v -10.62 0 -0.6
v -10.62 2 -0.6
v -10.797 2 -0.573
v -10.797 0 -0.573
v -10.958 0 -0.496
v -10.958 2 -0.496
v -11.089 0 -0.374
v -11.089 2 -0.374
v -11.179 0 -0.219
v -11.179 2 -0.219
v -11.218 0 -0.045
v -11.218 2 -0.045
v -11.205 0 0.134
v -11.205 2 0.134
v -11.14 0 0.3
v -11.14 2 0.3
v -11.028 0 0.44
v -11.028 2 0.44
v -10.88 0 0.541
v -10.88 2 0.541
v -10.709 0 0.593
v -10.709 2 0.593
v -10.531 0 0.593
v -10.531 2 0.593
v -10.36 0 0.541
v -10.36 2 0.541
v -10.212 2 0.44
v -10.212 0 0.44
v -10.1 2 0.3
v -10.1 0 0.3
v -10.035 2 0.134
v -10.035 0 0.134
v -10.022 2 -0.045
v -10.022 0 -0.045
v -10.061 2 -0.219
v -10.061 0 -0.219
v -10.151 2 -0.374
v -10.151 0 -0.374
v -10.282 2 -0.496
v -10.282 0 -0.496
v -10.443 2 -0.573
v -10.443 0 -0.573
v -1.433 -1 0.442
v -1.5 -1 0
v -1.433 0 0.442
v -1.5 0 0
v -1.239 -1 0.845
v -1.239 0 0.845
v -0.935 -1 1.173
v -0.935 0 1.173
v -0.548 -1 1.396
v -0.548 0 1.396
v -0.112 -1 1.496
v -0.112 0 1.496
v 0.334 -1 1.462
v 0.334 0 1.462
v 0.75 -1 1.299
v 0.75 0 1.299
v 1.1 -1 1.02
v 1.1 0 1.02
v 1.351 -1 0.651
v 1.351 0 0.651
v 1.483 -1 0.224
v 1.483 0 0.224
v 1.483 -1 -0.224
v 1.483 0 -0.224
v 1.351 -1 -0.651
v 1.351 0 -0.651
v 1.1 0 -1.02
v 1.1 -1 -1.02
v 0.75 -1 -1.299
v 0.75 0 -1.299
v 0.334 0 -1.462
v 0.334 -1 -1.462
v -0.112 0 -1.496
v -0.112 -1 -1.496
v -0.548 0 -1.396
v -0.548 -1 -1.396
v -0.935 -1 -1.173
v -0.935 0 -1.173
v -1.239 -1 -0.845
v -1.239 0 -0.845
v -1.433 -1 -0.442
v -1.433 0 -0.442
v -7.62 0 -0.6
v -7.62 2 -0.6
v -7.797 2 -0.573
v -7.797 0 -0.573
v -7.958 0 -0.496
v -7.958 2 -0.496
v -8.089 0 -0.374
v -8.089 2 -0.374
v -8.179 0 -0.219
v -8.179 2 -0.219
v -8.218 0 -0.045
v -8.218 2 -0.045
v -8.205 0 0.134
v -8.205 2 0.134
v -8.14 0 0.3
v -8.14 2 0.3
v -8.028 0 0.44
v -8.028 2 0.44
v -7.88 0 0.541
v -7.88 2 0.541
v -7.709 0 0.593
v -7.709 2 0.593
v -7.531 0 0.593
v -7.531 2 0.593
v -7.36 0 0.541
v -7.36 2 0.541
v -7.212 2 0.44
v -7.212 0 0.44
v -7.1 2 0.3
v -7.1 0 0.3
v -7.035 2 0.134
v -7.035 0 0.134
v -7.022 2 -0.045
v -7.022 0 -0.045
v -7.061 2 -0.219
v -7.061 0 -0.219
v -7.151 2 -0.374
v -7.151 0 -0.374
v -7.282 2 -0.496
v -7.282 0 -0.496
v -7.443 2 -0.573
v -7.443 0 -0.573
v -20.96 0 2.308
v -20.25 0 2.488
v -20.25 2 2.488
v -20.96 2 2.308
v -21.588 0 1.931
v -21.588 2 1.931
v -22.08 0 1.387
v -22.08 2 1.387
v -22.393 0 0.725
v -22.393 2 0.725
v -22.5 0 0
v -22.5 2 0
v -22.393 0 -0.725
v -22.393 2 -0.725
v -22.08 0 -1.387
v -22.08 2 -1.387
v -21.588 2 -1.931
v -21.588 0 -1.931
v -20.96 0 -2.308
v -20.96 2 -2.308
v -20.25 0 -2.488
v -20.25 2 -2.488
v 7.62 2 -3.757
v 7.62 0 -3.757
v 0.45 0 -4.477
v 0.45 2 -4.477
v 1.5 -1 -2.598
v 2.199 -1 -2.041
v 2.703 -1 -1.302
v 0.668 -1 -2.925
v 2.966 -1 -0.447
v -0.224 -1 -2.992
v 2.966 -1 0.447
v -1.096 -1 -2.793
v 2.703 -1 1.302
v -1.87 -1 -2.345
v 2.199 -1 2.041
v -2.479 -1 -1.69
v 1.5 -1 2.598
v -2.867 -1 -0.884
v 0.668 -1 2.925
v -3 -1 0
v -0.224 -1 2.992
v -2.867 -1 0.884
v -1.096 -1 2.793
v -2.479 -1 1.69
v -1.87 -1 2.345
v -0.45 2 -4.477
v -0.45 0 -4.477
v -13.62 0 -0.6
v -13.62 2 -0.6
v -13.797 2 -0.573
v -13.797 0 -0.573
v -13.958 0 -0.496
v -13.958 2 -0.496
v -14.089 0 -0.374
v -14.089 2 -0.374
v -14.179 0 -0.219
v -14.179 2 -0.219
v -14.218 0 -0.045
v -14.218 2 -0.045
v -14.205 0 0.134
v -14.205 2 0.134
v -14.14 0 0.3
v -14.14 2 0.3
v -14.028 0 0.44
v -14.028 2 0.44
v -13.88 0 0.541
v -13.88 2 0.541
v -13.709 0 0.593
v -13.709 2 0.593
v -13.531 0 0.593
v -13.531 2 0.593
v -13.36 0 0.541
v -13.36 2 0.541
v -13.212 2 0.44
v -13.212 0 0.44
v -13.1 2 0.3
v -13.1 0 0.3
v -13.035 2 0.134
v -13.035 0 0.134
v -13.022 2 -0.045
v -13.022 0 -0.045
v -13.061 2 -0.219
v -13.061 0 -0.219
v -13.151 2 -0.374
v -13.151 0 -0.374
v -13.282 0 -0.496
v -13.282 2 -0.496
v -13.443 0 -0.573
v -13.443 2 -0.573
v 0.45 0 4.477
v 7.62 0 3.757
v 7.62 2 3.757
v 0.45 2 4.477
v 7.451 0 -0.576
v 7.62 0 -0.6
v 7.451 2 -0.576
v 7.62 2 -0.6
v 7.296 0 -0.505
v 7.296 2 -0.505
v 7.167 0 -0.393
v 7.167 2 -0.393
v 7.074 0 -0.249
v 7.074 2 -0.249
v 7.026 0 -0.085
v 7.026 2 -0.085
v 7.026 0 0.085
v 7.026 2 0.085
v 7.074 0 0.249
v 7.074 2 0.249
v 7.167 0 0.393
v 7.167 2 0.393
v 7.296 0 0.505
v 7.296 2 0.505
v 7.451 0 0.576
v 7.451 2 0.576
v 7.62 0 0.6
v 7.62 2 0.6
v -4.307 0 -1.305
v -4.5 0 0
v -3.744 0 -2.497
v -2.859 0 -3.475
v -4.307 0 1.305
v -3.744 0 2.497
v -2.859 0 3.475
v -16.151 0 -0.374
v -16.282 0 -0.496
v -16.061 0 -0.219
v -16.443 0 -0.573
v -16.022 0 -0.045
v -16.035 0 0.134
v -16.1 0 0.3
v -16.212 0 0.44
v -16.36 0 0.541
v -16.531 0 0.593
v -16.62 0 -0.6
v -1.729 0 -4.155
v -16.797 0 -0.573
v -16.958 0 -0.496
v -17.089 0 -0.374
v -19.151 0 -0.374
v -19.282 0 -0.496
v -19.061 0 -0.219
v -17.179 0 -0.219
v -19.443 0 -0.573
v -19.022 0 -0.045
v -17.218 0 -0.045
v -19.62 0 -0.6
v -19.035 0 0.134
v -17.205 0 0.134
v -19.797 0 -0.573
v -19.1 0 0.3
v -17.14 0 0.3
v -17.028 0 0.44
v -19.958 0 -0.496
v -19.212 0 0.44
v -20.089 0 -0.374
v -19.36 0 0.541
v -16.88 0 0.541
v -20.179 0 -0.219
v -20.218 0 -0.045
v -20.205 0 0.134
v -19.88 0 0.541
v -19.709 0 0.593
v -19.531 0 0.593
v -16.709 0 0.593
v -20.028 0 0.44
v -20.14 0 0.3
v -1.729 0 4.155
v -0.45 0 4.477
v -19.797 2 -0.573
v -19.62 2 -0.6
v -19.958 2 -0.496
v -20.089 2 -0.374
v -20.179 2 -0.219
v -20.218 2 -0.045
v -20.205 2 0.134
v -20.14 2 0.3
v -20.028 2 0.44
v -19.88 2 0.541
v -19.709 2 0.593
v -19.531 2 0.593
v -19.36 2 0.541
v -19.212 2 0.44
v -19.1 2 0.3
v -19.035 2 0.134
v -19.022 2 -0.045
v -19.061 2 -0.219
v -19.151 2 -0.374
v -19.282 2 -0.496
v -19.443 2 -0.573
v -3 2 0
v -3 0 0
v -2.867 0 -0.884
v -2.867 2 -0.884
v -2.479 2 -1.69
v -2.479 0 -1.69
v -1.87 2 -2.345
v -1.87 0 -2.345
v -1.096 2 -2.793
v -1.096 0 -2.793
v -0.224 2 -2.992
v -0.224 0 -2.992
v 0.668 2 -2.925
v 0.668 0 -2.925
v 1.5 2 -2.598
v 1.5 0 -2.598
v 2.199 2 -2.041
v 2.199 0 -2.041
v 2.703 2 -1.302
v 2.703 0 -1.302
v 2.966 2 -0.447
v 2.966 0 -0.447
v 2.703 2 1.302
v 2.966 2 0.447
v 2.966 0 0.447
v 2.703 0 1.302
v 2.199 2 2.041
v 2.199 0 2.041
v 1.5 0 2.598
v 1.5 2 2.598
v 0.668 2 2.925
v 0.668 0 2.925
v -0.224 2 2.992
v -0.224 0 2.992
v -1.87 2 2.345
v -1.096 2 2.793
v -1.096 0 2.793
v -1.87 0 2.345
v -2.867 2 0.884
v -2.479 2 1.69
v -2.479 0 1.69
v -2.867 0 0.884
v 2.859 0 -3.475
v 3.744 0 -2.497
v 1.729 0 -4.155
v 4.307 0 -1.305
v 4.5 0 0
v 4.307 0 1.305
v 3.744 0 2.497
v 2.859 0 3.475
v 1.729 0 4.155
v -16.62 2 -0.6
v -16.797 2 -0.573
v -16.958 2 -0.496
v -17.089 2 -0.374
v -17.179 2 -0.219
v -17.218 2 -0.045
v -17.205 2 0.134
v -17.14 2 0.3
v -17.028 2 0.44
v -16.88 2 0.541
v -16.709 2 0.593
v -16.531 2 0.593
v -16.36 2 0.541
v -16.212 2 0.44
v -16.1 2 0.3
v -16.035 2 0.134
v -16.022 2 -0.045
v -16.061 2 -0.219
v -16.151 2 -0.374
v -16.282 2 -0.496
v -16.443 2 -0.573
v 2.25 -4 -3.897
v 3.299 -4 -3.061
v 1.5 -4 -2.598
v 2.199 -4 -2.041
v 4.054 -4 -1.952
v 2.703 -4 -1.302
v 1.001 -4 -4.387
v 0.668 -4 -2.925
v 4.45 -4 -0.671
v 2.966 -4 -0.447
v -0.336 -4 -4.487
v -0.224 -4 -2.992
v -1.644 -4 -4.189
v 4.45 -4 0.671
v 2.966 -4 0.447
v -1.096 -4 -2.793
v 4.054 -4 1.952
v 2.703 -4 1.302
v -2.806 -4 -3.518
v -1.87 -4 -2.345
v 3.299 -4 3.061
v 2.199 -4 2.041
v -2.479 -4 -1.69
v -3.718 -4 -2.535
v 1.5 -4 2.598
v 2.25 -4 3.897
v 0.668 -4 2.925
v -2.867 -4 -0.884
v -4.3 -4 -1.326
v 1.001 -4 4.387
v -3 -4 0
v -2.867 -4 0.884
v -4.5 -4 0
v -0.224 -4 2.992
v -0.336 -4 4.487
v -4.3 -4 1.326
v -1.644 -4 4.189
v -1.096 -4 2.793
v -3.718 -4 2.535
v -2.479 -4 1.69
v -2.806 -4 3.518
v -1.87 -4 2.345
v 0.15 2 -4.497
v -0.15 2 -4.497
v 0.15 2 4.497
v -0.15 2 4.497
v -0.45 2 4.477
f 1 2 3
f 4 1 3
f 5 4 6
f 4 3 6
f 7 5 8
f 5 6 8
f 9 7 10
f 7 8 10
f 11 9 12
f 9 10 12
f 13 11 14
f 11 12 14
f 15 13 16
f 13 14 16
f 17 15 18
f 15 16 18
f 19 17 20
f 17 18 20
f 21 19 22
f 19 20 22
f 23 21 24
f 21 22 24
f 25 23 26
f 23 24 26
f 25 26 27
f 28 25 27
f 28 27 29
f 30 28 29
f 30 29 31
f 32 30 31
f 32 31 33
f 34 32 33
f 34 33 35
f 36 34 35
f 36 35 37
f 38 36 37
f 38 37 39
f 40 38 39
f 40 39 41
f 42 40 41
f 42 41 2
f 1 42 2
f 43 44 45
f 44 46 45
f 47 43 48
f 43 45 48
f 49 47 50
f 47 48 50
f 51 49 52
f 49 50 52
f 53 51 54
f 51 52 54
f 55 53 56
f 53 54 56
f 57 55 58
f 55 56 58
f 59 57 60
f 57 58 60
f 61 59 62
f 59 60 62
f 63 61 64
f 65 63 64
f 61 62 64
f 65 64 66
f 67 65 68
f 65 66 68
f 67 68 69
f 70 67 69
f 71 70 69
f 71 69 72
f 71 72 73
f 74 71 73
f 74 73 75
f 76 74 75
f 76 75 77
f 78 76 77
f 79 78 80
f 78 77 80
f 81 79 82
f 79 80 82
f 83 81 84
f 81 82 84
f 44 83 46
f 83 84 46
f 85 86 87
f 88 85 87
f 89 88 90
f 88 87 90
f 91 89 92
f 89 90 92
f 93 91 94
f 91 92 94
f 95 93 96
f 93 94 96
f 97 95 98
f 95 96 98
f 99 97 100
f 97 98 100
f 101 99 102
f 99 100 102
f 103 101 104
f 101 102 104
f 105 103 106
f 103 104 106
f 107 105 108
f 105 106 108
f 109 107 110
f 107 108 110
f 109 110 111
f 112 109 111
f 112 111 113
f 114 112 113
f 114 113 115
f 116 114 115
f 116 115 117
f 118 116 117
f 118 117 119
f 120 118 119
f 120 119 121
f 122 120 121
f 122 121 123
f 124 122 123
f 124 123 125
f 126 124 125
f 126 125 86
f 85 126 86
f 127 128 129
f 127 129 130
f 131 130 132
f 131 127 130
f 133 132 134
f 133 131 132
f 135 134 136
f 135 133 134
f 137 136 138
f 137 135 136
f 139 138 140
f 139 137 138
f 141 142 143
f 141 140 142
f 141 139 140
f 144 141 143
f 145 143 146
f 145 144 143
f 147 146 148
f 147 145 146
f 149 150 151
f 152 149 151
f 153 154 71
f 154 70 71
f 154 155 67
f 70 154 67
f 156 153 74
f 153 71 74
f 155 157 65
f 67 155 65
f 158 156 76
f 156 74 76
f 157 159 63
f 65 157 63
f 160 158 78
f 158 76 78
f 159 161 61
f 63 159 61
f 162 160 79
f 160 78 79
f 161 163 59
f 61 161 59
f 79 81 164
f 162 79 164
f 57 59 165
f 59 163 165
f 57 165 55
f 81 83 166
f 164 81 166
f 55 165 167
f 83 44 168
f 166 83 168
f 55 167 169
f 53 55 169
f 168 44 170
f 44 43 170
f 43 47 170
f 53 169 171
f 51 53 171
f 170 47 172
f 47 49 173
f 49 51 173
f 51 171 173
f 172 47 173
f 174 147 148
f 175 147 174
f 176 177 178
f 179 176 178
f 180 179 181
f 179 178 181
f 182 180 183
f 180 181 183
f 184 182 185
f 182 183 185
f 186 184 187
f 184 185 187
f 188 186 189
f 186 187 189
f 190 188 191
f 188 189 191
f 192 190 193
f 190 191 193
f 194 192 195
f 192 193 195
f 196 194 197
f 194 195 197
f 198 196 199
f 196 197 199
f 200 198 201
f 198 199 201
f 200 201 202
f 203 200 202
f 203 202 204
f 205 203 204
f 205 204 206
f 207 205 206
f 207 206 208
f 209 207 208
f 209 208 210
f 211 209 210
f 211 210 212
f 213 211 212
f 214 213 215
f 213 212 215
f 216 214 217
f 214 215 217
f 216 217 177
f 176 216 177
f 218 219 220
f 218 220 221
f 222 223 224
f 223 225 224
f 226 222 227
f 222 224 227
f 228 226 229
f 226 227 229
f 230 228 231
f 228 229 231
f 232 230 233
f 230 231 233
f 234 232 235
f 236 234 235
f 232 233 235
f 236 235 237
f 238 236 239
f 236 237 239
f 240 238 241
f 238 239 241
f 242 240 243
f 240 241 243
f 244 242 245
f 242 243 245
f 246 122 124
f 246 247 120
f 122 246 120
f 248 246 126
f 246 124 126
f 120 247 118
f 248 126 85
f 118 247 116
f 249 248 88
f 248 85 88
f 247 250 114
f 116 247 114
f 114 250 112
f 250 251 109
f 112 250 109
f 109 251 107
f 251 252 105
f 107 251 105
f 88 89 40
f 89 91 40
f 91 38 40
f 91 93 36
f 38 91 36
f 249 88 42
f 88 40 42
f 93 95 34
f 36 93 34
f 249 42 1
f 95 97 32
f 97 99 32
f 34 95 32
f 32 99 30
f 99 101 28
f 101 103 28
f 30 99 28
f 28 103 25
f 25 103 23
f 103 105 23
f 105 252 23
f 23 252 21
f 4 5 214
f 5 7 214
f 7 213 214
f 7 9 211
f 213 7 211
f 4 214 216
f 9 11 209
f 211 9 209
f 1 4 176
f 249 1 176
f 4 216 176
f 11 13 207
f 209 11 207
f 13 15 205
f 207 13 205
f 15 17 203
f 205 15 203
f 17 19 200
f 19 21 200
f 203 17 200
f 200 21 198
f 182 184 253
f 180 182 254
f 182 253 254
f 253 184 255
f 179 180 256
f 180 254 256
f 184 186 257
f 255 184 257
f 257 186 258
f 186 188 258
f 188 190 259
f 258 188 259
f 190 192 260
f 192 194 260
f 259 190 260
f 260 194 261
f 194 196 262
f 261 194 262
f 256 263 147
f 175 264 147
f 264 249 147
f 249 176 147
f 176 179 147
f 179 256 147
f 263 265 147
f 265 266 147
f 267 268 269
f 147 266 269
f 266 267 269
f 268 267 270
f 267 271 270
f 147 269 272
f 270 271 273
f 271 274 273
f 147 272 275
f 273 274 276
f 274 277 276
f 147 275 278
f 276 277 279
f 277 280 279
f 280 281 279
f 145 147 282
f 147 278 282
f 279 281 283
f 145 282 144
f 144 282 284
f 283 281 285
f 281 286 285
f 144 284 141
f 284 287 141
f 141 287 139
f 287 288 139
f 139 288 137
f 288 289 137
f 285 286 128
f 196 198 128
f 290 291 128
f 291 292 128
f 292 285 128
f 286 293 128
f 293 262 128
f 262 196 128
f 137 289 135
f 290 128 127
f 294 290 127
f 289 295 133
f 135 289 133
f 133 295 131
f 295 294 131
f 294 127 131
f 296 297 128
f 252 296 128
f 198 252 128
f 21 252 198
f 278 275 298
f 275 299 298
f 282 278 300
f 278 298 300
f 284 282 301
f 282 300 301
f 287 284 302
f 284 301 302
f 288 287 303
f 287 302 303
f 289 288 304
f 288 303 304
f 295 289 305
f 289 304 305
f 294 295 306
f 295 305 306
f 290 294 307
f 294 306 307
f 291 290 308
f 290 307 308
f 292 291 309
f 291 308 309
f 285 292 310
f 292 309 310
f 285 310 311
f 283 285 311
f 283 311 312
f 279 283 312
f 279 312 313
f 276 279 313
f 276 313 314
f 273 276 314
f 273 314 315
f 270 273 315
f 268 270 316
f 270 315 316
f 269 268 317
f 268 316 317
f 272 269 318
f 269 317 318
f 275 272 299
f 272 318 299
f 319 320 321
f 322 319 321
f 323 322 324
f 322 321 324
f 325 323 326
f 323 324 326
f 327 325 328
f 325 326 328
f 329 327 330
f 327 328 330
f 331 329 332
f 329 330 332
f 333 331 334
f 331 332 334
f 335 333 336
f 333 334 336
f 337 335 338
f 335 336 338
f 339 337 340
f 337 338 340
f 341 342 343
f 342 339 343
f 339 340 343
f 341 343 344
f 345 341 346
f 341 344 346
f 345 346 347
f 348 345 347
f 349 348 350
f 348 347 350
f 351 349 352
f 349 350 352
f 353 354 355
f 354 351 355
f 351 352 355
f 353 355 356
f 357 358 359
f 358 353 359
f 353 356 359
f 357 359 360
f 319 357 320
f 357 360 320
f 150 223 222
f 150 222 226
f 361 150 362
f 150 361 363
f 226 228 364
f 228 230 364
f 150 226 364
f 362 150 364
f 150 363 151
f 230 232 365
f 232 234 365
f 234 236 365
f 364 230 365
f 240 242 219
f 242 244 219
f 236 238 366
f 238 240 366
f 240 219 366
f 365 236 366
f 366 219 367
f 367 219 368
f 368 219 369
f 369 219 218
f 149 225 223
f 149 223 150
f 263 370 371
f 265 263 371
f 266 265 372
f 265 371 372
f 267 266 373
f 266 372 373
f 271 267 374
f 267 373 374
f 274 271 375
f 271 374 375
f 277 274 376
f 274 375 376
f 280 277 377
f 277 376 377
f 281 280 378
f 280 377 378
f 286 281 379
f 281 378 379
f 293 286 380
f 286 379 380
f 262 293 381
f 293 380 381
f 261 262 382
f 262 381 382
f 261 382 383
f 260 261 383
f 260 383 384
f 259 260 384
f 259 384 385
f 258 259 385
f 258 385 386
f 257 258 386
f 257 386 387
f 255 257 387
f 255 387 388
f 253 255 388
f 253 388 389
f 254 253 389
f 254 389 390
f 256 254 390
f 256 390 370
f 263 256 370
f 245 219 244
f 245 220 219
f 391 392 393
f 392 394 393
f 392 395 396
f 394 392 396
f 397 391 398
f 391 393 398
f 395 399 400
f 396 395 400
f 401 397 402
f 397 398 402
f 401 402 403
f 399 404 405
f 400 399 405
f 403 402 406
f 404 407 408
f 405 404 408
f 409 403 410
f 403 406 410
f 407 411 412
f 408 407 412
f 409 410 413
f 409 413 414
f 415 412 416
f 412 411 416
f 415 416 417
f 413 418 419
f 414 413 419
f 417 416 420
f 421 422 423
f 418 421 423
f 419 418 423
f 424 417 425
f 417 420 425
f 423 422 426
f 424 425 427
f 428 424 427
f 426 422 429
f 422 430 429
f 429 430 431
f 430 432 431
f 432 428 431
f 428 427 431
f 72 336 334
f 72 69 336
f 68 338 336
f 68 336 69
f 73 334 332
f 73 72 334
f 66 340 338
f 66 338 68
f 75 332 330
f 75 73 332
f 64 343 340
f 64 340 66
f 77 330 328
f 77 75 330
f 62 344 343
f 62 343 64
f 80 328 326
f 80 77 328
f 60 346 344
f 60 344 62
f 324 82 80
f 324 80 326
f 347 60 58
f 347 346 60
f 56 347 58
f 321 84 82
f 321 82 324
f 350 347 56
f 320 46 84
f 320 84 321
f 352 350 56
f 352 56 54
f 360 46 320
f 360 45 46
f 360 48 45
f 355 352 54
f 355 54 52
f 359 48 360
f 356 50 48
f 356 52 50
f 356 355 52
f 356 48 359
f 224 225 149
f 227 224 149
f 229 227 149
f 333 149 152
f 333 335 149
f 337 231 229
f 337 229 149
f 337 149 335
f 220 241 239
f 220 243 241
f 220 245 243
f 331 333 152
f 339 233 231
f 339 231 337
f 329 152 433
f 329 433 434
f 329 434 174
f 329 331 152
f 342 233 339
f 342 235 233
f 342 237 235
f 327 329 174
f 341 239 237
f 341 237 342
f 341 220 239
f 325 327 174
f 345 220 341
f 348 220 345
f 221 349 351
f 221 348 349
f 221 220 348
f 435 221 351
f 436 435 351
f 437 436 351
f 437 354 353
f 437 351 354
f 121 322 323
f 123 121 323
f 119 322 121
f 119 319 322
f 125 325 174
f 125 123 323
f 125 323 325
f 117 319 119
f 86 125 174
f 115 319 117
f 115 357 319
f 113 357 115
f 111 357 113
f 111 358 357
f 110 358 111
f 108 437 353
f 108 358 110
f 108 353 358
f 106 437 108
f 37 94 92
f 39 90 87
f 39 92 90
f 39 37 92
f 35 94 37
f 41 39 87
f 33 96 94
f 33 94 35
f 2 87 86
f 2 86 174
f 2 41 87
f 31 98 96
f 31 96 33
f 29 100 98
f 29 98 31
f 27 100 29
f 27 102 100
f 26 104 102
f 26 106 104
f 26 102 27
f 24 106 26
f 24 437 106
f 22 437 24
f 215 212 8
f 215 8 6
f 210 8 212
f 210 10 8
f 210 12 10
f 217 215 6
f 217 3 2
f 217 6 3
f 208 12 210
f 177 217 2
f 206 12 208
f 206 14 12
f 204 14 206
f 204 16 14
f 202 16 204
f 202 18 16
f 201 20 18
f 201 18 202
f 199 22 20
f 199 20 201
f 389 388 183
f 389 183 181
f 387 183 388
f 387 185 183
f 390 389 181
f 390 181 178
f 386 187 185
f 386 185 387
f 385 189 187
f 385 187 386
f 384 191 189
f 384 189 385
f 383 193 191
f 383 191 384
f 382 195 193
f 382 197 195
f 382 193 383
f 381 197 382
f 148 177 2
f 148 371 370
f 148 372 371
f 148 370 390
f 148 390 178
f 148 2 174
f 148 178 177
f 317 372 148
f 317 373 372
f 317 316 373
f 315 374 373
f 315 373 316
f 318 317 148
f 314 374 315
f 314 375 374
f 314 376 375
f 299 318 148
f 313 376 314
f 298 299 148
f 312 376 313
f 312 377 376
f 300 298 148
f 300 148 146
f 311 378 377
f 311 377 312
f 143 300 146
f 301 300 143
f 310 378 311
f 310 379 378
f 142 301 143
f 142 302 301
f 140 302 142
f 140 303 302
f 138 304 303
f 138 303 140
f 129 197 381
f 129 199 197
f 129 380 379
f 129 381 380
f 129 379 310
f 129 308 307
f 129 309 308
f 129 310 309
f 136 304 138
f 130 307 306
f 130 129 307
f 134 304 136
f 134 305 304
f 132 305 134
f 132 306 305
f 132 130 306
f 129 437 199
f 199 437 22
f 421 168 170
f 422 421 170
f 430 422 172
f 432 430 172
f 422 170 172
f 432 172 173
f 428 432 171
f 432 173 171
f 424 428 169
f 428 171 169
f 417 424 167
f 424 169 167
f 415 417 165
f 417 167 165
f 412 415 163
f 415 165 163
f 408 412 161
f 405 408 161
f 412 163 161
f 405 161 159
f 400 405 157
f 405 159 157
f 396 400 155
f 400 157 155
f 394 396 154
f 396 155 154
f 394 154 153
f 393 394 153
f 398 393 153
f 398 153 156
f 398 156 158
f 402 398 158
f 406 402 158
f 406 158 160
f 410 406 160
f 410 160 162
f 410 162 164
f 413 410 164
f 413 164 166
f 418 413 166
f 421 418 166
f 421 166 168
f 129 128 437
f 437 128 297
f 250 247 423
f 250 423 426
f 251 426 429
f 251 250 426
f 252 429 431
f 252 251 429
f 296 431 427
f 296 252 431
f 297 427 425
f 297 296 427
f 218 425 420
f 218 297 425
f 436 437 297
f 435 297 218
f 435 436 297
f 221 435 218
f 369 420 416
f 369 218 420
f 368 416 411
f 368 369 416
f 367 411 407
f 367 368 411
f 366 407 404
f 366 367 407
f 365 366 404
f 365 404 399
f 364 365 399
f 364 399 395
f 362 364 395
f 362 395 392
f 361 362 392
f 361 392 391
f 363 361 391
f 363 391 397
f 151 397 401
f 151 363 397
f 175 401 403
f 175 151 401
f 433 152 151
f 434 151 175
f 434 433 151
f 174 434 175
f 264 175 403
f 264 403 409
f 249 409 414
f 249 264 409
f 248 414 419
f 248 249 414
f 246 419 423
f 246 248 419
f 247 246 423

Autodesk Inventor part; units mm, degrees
ref_plane "YZ Plane" through (0, 0, 0) normal (1, 0, 0) x (0, 1, 0)
ref_plane "XZ Plane" through (0, 0, 0) normal (0, 1, 0) x (-1, 0, 0)
ref_plane "XY Plane" through (0, 0, 0) normal (0, 0, 1) x (1, 0, 0)
sketch "Sketch1" plane through (0, 0, 0) normal (0, 1, 0) x (-1, 0, 0)
  circle A0 centre (0, 0) radius 3
  circle A1 centre (0, 0) radius 4.5
  line L0 (0, 0) -> (7.62, 0) construction
  circle A2 centre (0, 0) radius 1.5
  line L1 (0, 0) -> (0, 4.5) construction
  arc A3 (20.25, -2.4875) -> (20.25, 2.4875) centre (20, 0) ccw
  line L2 (20, 0) -> (0, 0)
  arc A4 (-20.25, 2.4875) -> (-20.25, -2.4875) centre (-20, 0) ccw
  line L3 (20.25, 2.4875) -> (0.45, 4.4774)
  line L4 (20.25, -2.4875) -> (0.45, -4.4774)
  line L5 (-20.25, -2.4875) -> (-0.45, -4.4774)
  line L6 (-20.25, 2.4875) -> (-0.45, 4.4774)
  point P0 (10.62, 0)
  point P1 (13.62, 0)
  point P2 (16.62, 0)
  point P3 (19.62, 0)
  point P4 (-7.62, 0)
  point P5 (-7.62, 0)
  point P6 (-10.62, 0)
  point P7 (-13.62, 0)
  point P8 (-16.62, 0)
  point P9 (-19.62, 0)
  dimension "d0" = 6
  dimension "d1" = 9
  dimension "d2" = 7.62
  dimension "d6" = 3
  dimension "d9" = 3
  dimension "d14" = 2.5
  dimension "d15" = 40
extrude "Extrusion1" add sketch "Sketch1" along normal blind 2 contours A1 | A1 L3 A3 L4 | A1 L5 A4 L6
extrude "Extrusion2" add sketch "Sketch1" against normal blind 1 contours A0 | A1
extrude "Extrusion3" add sketch "Sketch1" against normal blind 4 contours A1
hole "Hole1" at (-7.62, 0, 0) at (-10.62, 0, 0) at (-13.62, 0, 0) at (-16.62, 0, 0) at (-19.62, 0, 0) at (19.62, 0, 0) at (16.62, 0, 0) at (13.62, 0, 0) at (10.62, 0, 0) at (7.62, 0, 0) direction (0, 1, 0) diameter 1.2 depth 8 tip angle 118
sketch "Sketch2" plane through (0, 2, 0) normal (0, 1, 0) x (1, 0, 0)
  circle A0 centre (10.62, 0) radius 0.6 projected
  circle A1 centre (16.62, 0) radius 0.6 projected
  circle A2 centre (19.62, 0) radius 0.6 projected
  circle A3 centre (13.62, 0) radius 0.6 projected
  circle A4 centre (7.62, 0) radius 0.6 projected
  line L0 (0.45, -4.4774) -> (20.25, -2.4875) projected
  arc A5 (20.25, -2.4875) -> (20.25, 2.4875) centre (20, 0) ccw projected
  line L1 (20.25, 2.4875) -> (0.45, 4.4774) projected
  line L2 (7.62, -3.7568) -> (7.62, 3.7568)
extrude "Extrusion4" cut sketch "Sketch2" against normal up to next contours A4 L2 | A4 L2 L1 A5 L0 picked at (7.7764, 0.1247)
properties part number "servo arm HK15138 2 cut to 1"
